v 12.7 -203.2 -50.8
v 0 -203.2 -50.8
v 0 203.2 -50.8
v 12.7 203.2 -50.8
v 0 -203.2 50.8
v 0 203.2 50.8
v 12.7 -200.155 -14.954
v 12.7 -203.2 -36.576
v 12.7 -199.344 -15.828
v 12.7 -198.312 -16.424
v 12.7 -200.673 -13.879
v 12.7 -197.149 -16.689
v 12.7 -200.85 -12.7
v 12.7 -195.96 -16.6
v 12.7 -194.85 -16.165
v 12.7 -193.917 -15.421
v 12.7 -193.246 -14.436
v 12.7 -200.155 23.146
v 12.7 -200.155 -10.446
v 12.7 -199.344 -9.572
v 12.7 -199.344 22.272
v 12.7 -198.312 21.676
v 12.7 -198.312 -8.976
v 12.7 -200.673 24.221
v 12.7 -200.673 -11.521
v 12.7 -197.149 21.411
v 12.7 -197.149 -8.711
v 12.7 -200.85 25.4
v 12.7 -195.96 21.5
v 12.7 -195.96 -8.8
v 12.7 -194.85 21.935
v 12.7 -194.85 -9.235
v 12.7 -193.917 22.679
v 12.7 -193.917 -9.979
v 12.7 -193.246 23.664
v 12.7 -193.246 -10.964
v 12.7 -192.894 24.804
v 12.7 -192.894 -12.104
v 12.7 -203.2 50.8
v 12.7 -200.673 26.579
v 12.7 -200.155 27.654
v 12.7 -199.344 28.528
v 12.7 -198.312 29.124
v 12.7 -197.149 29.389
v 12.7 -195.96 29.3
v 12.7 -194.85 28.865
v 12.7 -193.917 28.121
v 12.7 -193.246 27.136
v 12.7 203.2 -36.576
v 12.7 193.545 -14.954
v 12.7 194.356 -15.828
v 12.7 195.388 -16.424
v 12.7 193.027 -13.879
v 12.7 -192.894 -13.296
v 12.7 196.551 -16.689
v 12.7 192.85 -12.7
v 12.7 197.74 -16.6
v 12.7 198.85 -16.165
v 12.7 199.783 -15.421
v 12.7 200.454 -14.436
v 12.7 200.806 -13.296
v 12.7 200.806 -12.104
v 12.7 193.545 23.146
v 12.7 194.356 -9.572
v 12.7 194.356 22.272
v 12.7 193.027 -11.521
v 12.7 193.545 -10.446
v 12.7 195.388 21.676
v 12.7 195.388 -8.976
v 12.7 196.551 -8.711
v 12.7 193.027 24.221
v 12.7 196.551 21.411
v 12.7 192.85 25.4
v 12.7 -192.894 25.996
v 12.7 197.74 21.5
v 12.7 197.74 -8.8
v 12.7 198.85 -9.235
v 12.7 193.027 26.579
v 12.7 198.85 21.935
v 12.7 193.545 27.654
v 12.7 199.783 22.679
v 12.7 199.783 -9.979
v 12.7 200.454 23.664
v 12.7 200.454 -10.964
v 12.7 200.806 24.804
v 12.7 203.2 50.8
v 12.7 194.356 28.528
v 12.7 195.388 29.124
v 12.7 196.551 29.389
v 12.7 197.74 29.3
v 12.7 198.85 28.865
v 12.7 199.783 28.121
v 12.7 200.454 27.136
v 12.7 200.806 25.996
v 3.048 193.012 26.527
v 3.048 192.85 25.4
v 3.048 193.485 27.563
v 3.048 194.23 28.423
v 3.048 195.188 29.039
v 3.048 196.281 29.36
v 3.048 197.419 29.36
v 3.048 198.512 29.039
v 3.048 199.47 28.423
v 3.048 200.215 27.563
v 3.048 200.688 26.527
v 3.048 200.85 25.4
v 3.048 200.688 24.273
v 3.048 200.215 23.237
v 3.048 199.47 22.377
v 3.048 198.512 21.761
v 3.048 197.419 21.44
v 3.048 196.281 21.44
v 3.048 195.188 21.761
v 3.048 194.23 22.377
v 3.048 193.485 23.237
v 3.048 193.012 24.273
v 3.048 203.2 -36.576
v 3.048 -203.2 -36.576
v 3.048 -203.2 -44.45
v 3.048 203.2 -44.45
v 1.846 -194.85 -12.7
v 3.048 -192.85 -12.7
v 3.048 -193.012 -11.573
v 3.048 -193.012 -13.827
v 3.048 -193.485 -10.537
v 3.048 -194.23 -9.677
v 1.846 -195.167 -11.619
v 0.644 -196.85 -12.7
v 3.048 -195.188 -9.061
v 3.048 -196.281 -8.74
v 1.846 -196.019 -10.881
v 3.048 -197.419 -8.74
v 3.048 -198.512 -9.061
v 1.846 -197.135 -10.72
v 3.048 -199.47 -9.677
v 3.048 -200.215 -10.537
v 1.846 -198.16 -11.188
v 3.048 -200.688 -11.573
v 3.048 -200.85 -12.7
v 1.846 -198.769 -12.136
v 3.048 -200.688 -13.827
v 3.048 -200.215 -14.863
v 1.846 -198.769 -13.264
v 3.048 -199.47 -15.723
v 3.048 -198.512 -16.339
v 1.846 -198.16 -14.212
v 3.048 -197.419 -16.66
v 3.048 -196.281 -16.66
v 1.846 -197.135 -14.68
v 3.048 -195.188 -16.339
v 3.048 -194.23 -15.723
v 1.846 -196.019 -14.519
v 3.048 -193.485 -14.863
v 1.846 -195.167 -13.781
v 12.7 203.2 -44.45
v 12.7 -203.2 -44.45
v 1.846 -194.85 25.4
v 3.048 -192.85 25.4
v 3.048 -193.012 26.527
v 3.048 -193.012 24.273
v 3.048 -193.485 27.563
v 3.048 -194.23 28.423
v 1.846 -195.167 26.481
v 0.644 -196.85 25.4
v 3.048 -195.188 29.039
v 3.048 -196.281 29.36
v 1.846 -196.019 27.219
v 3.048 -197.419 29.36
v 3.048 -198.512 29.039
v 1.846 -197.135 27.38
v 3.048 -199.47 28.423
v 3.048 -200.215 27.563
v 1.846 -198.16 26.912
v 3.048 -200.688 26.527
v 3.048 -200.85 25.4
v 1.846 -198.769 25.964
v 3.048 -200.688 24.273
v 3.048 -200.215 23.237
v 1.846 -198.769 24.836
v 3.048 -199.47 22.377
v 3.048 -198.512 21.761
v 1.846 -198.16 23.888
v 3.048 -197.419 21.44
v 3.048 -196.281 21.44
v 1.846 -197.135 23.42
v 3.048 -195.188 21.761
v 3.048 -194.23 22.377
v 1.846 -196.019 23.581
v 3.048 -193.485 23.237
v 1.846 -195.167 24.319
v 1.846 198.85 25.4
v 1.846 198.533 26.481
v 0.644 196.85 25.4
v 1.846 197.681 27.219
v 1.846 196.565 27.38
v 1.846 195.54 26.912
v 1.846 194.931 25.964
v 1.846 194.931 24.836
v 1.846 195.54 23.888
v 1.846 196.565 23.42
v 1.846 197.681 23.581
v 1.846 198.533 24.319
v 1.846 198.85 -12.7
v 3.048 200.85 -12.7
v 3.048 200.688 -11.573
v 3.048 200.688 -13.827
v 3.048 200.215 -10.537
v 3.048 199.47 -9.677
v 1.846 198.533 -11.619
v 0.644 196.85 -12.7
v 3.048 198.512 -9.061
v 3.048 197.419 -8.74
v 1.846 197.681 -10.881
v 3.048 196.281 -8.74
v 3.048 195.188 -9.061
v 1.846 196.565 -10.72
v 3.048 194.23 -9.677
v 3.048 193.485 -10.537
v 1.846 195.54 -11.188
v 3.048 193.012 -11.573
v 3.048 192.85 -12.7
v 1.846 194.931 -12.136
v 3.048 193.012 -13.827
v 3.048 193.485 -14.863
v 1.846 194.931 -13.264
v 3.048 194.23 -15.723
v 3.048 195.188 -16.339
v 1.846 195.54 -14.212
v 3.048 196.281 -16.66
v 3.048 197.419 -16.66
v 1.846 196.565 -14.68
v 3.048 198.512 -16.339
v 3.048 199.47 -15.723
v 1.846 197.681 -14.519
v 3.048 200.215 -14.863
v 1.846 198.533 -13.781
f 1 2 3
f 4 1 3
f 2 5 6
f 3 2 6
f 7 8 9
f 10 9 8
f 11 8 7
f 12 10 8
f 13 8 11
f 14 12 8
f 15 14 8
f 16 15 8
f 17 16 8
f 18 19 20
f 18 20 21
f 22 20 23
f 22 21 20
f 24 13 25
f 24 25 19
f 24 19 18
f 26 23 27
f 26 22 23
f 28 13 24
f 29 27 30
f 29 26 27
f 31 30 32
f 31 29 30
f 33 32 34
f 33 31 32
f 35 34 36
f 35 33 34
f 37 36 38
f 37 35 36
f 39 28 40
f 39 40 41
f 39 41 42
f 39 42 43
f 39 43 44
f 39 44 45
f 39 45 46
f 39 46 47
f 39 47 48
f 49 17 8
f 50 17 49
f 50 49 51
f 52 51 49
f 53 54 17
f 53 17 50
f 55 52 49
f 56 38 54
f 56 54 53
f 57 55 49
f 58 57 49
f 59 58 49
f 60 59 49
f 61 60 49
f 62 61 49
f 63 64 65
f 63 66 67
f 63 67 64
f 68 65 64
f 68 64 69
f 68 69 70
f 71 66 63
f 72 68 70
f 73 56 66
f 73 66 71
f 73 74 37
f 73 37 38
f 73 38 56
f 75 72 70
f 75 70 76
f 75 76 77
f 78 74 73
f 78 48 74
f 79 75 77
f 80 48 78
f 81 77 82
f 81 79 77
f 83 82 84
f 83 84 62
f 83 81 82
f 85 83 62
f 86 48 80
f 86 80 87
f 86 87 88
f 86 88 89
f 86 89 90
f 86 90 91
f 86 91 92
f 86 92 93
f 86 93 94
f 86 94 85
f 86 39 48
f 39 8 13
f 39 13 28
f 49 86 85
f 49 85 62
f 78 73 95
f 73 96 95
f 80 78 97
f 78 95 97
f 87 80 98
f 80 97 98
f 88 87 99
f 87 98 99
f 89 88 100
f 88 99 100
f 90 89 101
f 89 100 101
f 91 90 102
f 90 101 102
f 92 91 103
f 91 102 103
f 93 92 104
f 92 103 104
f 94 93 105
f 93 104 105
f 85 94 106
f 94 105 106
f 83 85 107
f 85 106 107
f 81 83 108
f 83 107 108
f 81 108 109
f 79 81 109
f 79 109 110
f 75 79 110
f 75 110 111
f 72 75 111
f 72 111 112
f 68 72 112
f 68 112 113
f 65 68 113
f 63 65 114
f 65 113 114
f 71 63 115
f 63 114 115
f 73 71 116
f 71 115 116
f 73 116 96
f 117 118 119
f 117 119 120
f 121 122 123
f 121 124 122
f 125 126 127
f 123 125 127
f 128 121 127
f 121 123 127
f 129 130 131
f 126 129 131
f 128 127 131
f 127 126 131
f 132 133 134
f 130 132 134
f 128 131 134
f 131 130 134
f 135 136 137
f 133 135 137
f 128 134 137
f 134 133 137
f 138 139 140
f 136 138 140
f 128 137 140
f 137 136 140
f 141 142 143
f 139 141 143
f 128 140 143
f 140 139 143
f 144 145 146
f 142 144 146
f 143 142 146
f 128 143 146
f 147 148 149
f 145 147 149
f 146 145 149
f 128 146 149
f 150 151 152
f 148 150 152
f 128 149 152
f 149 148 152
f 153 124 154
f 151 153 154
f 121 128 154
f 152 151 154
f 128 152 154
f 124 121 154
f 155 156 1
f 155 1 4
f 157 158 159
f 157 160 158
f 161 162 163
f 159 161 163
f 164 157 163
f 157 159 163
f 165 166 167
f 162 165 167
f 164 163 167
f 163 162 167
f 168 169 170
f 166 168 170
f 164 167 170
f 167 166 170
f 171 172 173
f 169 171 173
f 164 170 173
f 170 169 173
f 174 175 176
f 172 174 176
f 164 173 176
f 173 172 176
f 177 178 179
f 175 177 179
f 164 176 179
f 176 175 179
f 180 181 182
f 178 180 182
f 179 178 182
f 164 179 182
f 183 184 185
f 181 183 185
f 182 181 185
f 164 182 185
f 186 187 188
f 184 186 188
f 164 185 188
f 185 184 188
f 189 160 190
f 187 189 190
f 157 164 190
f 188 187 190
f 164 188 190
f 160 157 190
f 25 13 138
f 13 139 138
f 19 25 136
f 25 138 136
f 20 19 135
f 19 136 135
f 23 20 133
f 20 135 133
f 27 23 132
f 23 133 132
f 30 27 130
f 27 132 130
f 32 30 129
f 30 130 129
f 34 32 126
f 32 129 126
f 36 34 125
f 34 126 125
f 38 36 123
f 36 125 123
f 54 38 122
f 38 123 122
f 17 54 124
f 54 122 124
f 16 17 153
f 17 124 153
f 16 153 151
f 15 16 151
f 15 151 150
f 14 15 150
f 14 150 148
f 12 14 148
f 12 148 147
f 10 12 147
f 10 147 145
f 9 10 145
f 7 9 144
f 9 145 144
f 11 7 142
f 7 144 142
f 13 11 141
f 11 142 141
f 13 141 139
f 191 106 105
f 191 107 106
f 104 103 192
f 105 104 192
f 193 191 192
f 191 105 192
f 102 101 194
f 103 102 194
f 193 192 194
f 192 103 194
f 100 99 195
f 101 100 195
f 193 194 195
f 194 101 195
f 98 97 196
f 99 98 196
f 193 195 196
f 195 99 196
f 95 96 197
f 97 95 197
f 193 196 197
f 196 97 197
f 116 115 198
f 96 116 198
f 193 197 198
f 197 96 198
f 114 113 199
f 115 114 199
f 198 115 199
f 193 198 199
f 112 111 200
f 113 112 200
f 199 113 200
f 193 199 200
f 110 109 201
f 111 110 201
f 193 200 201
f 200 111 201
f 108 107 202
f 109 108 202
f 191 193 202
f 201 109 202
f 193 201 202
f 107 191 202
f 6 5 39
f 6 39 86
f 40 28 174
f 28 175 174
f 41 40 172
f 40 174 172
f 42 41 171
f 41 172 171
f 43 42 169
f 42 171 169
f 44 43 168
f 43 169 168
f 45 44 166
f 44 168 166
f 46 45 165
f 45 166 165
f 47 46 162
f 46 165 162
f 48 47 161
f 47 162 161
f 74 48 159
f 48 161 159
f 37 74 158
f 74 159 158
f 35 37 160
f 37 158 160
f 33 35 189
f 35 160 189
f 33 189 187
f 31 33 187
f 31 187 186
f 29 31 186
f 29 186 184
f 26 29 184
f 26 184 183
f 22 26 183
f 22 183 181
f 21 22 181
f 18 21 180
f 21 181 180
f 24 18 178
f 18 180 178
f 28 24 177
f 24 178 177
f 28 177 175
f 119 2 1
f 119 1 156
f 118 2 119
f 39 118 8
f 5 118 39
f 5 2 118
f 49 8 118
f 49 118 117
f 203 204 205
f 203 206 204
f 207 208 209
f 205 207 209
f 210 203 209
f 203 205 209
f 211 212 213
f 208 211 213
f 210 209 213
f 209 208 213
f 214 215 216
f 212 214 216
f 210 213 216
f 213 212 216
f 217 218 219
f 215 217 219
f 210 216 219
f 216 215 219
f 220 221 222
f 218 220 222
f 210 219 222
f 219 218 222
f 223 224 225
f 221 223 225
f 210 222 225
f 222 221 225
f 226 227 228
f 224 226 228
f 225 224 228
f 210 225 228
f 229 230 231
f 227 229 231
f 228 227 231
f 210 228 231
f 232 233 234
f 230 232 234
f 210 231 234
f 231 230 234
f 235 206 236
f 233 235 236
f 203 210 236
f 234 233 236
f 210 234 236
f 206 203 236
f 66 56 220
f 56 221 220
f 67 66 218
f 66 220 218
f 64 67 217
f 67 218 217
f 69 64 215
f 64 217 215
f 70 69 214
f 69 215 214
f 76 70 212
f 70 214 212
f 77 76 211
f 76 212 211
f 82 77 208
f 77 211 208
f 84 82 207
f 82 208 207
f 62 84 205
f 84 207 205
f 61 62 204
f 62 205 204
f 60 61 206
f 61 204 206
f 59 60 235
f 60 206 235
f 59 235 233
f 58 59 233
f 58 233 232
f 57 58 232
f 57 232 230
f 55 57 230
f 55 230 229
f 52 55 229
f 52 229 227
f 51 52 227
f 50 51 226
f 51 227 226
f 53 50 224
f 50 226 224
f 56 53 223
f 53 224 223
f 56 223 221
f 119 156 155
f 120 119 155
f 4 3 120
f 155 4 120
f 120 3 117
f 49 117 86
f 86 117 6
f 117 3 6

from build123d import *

# Parameters (mm, degrees)
F0_W     = 406.4
F0_H     = 101.6
F1_DEPTH = 12.7
F2_W     = 406.4
F2_H     = 7.874
F3_DEPTH = 9.652
F5_D     = 8.001
F5_DEPTH = 9.652
F5_TIP   = 2.4037429064


with BuildPart() as f1:
    # F0 (on Right) → F1 (new body)
    with BuildSketch(Plane.YZ):
        Rectangle(F0_W, F0_H)
    extrude(amount=F1_DEPTH)

    # F2 (on face) → F3 (cut)
    with BuildSketch(Plane.YZ.offset(12.7)):
        with Locations((0, -40.513)):
            Rectangle(F2_W, F2_H)
    extrude(amount=-F3_DEPTH, mode=Mode.SUBTRACT)

    # F5
    with Locations(Plane.YZ.offset(12.7)):
        with Locations((-196.85, 25.4), (-196.85, -12.7), (196.85, 25.4), (196.85, -12.7)):
            Hole(F5_D / 2, depth=F5_DEPTH)
            with Locations((0, 0, -(F5_DEPTH + F5_TIP / 2))):  # 118° drill point
                Cone(0, F5_D / 2, F5_TIP, mode=Mode.SUBTRACT)


solid = f1.part
